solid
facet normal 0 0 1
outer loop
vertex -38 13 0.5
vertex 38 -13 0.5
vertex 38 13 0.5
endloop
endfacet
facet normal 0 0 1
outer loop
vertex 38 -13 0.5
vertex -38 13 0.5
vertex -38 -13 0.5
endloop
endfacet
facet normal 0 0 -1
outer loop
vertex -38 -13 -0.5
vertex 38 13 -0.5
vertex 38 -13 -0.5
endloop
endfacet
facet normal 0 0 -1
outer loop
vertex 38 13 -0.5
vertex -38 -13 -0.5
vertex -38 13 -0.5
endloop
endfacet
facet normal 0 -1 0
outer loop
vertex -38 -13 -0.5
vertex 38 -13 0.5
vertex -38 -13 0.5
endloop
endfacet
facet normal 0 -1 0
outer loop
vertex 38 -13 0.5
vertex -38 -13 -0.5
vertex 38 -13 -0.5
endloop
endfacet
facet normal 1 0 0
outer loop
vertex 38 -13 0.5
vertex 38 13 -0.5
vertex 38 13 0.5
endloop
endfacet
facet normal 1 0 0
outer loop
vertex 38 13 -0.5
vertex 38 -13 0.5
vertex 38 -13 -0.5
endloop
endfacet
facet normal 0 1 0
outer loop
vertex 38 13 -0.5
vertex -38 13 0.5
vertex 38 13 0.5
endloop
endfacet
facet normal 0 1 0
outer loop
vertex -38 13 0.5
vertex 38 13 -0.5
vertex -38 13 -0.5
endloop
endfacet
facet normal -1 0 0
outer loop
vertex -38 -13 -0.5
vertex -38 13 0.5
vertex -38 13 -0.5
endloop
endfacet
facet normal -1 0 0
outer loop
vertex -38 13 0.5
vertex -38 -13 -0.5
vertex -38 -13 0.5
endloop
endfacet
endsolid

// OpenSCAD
// ----------------------------------------------------
// Material Hyperobject Compensations
// (Passed dynamically by the Commons API)
// ----------------------------------------------------
mat_shrinkage_x = 1.0;
mat_shrinkage_y = 1.0;
mat_shrinkage_z = 1.0;

mat_clear_press = 0.0;
mat_clear_slide = 0.0;
mat_clear_loose = 0.0;

// Standard Microscope Slide Dimensions (ISO 8037)
function slide_slot_width(thickness, tolerance) = thickness + tolerance + mat_clear_slide + 0.1;
function slide_pitch(slot_w, rib_w) = slot_w + rib_w;

module slide_retention_rib(height, depth, root_w, tip_w, chamfer_h) {
  // ONE polyhedron, not a cube unioned with a chamfer cap.
  //
  // The rib used to be `cube([root_w, depth, height - chamfer_h])` unioned with
  // a polyhedron frustum that started at exactly z = height - chamfer_h. That
  // is a zero-overlap coincident-face union: the two solids share an exact
  // plane and touch on it rather than interpenetrating. CGAL resolves it, but
  // OpenSCAD's Manifold backend -- which is what the platform and
  // `y4d-spec check --render` both use -- snaps near-coincident vertices and
  // tears the pair apart at that plane. Three or more ribs in one array was
  // enough: a 4-rib array came out as 8 shells, not watertight, and a 20-slot
  // box_base as 119 bodies with 26 of them negative.
  //
  // Written as a single closed polyhedron there is no interface plane at all,
  // so there is nothing to tear. Faces are wound CLOCKWISE seen from outside,
  // which is what OpenSCAD wants (the opposite of a CadQuery Shell); wound the
  // other way it renders NoError but inside-out.
  //
  // Volume and extents are unchanged to 3 decimal places; only the redundant
  // interface faces go away (28 -> 20 facets per rib).
  _ch = min(chamfer_h, height);
  _bz = height - _ch;
  _lo = (root_w - tip_w) / 2;
  _hi = (root_w + tip_w) / 2;
  polyhedron(
    points=[
      // 0-3: base, z = 0
      [0, 0, 0], [root_w, 0, 0], [root_w, depth, 0], [0, depth, 0],
      // 4-7: chamfer start, z = height - chamfer_h
      [0, 0, _bz], [root_w, 0, _bz], [root_w, depth, _bz], [0, depth, _bz],
      // 8-11: tip, z = height
      [_lo, 0, height], [_hi, 0, height], [_hi, depth, height], [_lo, depth, height],
    ],
    faces=[
      [0, 1, 2, 3],                                        // base
      [11, 10, 9, 8],                                      // tip (opposite base winding)
      [0, 4, 5, 1], [1, 5, 6, 2], [2, 6, 7, 3], [3, 7, 4, 0],       // prism sides
      [4, 8, 9, 5], [5, 9, 10, 6], [6, 10, 11, 7], [7, 11, 8, 4],   // chamfer sides
    ]
  );
}

module slide_slot_array(count, pitch, height, depth, root_w, tip_w, chamfer_h, tapered) {
  for (i = [0:count]) {
    translate([i * pitch, 0, 0])
      slide_retention_rib(height, depth, root_w, tip_w, chamfer_h);
  }
}

// ----------------------------------------------------
// ISO 8037-1 Bounded 4D Geometry
// ----------------------------------------------------

module iso_8037_slide(length, width, thickness) {
  // A standard microscope slide volumetric cartridge.
  // Glass usually has polished or ground edges.
  cube([length, width, thickness], center=true);
}

// ----------------------------------------------------
// Cartridge Execution Logic (Triggered by Manifest)
// ----------------------------------------------------

slide_standard = 0; // [0:ISO 8037-1 Primary, 1:ISO 8037-1 Alternate, 2:ISO 8255 #1.5H Cover, 3:ISO 8255 #1 Cover, 4:Custom]
custom_slide_length = 76.0;
custom_slide_width = 26.0;
custom_slide_thickness = 1.0;

render_mode = 0; // [0:main]

if (render_mode == 0) {
  // Material simulation logic for transparency via OpenSCAD nightly alpha
  color([0.8, 0.9, 0.9, 0.4]) {
    // Apply Material Hyperobject Shrinkage Compensation
    scale([mat_shrinkage_x, mat_shrinkage_y, mat_shrinkage_z]) {
      if (slide_standard == 0) {
        // ISO 8037-1 Primary
        iso_8037_slide(76.0, 26.0, 1.0);
      } else if (slide_standard == 1) {
        // ISO 8037-1 Alternate
        iso_8037_slide(75.0, 25.0, 1.0);
      } else if (slide_standard == 2) {
        // ISO 8255 #1.5H Cover Glass
        iso_8037_slide(22.0, 22.0, 0.17);
      } else if (slide_standard == 3) {
        // ISO 8255 #1 Cover Glass
        iso_8037_slide(22.0, 22.0, 0.15);
      } else if (slide_standard == 4) {
        // Custom Geometry
        iso_8037_slide(custom_slide_length, custom_slide_width, custom_slide_thickness);
      }
    }
  }
}
